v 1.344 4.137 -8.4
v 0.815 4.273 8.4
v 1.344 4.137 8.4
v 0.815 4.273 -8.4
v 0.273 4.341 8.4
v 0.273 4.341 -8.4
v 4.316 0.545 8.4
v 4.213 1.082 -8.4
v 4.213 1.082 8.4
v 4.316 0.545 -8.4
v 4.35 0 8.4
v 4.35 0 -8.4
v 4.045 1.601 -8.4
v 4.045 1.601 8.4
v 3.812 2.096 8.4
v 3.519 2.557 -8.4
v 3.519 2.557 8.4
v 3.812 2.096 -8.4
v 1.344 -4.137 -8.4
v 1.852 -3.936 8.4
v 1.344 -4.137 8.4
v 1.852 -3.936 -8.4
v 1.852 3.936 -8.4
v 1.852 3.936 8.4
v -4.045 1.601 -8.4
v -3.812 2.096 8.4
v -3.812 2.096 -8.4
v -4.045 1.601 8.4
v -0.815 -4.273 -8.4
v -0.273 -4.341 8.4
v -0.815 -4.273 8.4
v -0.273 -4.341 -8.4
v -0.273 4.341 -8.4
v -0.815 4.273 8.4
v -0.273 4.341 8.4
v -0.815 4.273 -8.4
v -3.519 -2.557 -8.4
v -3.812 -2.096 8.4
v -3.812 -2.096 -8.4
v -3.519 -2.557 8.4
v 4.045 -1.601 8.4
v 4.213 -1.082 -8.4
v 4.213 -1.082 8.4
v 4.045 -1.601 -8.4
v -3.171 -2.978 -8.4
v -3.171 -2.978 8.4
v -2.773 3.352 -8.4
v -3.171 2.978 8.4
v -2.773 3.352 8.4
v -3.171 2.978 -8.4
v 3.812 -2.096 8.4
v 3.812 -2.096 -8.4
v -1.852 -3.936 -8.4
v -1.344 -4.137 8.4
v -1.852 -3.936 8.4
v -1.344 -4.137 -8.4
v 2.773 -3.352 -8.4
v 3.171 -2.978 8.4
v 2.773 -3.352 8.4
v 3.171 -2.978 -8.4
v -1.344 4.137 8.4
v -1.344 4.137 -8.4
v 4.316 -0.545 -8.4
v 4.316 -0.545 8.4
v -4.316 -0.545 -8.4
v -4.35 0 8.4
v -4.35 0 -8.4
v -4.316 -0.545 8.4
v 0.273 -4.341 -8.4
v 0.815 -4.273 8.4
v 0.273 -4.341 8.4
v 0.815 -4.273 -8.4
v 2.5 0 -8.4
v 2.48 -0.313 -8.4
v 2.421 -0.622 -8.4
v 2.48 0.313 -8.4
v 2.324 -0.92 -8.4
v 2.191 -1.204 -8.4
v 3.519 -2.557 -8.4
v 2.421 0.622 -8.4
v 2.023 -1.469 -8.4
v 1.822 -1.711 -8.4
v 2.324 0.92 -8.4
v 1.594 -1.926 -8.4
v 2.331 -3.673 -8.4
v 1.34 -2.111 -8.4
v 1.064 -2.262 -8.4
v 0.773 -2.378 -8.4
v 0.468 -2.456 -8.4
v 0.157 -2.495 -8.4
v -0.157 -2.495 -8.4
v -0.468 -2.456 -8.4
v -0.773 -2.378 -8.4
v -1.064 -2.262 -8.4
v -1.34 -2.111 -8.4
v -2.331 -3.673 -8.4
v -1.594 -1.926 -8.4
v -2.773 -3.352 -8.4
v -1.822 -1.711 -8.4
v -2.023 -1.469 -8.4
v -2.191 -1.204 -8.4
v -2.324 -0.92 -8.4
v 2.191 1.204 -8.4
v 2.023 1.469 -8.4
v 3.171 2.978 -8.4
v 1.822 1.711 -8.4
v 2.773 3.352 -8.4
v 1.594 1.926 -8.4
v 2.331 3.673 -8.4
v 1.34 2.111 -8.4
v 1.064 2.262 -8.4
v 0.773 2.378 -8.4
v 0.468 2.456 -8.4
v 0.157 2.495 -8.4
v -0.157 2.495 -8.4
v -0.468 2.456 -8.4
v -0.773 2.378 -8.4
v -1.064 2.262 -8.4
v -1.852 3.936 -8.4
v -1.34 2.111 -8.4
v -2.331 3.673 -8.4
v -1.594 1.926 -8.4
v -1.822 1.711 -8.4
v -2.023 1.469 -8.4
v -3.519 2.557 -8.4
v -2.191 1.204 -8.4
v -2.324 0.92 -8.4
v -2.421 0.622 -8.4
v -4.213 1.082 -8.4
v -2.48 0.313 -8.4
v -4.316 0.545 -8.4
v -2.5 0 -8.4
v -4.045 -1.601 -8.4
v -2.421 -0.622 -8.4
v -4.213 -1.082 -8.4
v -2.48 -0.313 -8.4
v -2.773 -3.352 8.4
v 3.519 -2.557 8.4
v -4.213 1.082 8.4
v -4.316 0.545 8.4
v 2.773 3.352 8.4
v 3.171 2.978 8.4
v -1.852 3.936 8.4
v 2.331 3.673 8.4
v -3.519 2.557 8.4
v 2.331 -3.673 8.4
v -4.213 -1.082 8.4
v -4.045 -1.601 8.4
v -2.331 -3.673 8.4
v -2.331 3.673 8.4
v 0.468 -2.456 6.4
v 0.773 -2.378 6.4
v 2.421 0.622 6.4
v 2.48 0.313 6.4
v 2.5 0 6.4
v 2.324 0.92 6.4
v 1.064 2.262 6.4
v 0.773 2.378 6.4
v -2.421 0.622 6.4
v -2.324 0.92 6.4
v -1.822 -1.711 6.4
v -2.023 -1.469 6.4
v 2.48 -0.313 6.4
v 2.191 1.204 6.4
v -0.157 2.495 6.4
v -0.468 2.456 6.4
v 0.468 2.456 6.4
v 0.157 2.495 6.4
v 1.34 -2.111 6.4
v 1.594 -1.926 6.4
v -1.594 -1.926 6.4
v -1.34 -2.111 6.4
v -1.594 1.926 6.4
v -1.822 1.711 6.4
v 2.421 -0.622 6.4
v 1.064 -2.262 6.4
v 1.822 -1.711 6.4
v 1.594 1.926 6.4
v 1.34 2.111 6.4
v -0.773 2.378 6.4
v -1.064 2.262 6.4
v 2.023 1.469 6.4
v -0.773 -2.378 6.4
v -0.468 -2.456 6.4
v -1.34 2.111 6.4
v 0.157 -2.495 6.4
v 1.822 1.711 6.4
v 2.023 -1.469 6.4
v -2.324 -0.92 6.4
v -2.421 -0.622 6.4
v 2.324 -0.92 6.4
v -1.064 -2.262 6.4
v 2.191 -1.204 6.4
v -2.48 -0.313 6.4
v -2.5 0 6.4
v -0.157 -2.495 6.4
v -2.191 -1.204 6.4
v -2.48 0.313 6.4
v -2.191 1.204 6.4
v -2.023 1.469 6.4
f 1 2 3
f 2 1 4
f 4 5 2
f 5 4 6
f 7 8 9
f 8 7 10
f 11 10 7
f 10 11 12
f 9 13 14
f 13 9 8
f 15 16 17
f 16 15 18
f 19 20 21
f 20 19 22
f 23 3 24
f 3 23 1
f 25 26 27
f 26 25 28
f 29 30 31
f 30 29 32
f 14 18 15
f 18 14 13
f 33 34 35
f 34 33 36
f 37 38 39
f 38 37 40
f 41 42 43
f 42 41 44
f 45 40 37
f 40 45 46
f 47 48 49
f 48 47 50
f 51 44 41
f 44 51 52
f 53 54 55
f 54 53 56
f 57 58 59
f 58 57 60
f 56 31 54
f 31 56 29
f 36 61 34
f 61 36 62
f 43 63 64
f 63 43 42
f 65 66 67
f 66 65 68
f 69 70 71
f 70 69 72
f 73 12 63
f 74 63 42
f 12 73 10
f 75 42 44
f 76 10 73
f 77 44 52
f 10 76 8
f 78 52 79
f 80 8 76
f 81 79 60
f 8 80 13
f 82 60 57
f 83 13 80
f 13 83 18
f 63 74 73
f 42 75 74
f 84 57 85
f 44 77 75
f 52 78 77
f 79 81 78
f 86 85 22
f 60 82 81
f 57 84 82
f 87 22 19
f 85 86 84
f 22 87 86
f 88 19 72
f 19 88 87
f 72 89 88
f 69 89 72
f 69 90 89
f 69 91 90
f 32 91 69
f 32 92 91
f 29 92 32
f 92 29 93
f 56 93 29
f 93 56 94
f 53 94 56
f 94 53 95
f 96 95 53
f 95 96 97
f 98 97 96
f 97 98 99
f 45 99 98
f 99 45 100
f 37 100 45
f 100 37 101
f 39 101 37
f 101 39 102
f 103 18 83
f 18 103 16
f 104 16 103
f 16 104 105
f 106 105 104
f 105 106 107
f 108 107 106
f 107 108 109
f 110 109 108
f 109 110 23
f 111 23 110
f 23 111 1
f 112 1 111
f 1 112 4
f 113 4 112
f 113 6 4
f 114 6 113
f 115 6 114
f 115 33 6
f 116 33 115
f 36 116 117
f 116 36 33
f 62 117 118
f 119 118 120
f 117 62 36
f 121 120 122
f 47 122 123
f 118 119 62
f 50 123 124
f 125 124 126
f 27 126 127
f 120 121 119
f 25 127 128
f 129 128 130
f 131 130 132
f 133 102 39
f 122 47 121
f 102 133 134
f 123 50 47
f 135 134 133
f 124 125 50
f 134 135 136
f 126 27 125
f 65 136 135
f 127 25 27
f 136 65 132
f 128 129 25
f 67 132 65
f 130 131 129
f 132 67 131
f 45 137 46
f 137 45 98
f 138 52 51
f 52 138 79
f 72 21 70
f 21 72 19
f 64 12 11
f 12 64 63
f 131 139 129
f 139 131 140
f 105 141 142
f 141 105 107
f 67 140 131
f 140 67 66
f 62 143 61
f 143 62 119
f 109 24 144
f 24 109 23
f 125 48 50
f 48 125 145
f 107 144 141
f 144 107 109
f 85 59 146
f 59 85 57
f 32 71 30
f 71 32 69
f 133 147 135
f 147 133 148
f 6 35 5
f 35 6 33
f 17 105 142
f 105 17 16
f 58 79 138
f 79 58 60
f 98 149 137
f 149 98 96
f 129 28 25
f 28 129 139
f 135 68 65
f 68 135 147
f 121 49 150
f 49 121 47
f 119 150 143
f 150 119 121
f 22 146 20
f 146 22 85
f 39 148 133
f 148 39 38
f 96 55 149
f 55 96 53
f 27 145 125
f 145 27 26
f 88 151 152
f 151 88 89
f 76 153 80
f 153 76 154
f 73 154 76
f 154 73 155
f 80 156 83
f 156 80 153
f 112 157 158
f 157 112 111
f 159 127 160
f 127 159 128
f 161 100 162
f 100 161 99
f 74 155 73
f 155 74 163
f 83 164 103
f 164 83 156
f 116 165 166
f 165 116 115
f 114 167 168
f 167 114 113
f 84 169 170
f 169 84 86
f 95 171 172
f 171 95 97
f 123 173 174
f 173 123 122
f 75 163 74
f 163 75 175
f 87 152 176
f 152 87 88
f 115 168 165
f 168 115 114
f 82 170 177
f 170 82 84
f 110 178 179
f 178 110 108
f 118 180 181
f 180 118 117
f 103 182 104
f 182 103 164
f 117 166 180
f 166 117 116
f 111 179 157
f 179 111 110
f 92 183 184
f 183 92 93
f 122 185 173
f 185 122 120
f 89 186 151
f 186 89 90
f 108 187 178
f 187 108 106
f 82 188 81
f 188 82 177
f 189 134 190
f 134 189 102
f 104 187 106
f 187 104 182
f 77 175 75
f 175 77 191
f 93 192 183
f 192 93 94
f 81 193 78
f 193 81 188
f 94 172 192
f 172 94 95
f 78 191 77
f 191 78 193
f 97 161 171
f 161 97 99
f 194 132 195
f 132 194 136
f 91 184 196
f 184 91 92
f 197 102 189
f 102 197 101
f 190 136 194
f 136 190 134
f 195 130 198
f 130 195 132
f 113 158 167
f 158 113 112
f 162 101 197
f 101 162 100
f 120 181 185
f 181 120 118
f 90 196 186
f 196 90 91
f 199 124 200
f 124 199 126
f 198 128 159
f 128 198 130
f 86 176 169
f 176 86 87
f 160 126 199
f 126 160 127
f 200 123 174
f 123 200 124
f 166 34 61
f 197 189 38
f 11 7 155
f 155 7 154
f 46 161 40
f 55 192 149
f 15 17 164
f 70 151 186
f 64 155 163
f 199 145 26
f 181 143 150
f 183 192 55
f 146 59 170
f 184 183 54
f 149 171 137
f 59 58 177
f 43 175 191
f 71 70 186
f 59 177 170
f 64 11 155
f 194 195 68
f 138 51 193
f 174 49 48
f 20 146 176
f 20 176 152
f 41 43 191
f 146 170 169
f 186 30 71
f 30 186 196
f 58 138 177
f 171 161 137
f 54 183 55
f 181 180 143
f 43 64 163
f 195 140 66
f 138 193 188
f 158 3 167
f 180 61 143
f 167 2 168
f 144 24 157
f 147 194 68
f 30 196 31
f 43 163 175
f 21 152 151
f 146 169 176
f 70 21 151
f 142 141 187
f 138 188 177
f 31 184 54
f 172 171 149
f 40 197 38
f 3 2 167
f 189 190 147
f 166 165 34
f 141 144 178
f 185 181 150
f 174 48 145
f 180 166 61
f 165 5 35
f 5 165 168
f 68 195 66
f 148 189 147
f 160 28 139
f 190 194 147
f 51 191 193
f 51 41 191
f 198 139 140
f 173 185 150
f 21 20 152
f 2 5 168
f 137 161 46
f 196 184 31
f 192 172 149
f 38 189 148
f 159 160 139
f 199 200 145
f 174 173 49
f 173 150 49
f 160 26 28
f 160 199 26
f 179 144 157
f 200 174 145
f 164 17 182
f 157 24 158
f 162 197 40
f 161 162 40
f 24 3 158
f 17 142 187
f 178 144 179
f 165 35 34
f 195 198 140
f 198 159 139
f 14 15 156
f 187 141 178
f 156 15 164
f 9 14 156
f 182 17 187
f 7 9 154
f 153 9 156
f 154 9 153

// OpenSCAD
// file: ../_lib_/cap3d.scad
module cap3d(outer_radius=20, height=10, walls_thickness=2, top_thickness=-1){
    /* module for round lid cap*/
    top_thickness = top_thickness <0 ? walls_thickness : top_thickness;
    r_outer = outer_radius;
    h_outer = height;
    r_inner = outer_radius - walls_thickness;
    h_inner = height - top_thickness;
    inner_z_offset = top_thickness;
    
    difference(){
        color("blue")cylinder(h=h_outer ,r=r_outer ,center=true); //outer
        translate([0,0,top_thickness]) color("red")cylinder(h=h_inner ,r=r_inner ,center=true); //inner
        }//difference
    } //module
    
  $fn=90;
//  cap3d(top_thickness=0);
// file: ../_lib_/straight_pipe3d.scad
module straight_pipe3d(r_inner=4, r_outer=6, length=10){

        difference(){
            color("blue")cylinder(h=length ,r=r_outer ,center=true); //outer
            color("red") cylinder(h=length ,r=r_inner ,center=true); //inner
        }//difference

    }//module
    
/*
$fn=60;
translate([0,0,-3]) straight_pipe3d();
translate([0,3,0]) rotate([90,0,0]) straight_pipe3d();
    */
// main file
include <../_lib_/straight_pipe3d.scad>
include <../_lib_/cap3d.scad>

$fn= 50;

barrel_inner_r = 0.5*5;
barrel_outer_r = 0.5*8.7;
intercoil_spacing = 8.8;
barrel_halflength = 15;
LED_r = 3;
LED_length=8;
overlaping_part_length = 1.8;
overlaping_part_r = (11);
overlaping_part_with_LED_length = 7;
barrel_fitting_margin = 0.25;



module barrel(length=barrel_halflength+overlaping_part_length) {
    difference(){
        straight_pipe3d(r_inner=barrel_inner_r, r_outer=barrel_outer_r, length=length);
        translate ([0,0,0.5*(length-2)]) cylinder(h=2,r2 = 0.5*8.7, r1=0.5*5, center=true);
    }//difference
}//module

module barrel_with_sensor() {
    
    walls_thickness=overlaping_part_r-barrel_inner_r;
    LED_cap_offset =-0.5*(barrel_halflength+1.0*overlaping_part_with_LED_length); //poloviny, protoze vsude je center=true;
    thin_cap_offset =-1.0*(0.5*barrel_halflength+1.0*overlaping_part_with_LED_length+0.5*overlaping_part_length);
    
    union(){
    color("black")barrel(length=barrel_halflength);
    
    translate([0,0,LED_cap_offset])
    
    difference(){
        cap3d(outer_radius=overlaping_part_r, 
              height=overlaping_part_with_LED_length, 
              walls_thickness=walls_thickness*1, //DBG
              top_thickness=0);
        translate([0,0,0]) rotate ([90,0,0])cylinder(h=120, r=LED_r, center=true);
    }//difference
    
    translate([0,0,thin_cap_offset])
    cap3d(outer_radius=overlaping_part_r*1.0, 
          height=overlaping_part_length, 
          walls_thickness=(walls_thickness-barrel_fitting_margin), 
          top_thickness=0);
    }//union
}//module

module xray(){
    difference(){
        //barrel();
        children();
        translate ([0,15,0]) cube([100,30,100],center=true);
    }//diff
}//module

//projection(cut=true) rotate([0,90,0])barrel_with_sensor();
//xray() barrel_with_sensor();
//barrel_with_sensor();
barrel();

//cap3d(outer_radius=overlaping_part_r, height=overlaping_part_with_LED_length, walls_thickness=overlaping_part_r-barrel_inner_r, top_thickness=0);
